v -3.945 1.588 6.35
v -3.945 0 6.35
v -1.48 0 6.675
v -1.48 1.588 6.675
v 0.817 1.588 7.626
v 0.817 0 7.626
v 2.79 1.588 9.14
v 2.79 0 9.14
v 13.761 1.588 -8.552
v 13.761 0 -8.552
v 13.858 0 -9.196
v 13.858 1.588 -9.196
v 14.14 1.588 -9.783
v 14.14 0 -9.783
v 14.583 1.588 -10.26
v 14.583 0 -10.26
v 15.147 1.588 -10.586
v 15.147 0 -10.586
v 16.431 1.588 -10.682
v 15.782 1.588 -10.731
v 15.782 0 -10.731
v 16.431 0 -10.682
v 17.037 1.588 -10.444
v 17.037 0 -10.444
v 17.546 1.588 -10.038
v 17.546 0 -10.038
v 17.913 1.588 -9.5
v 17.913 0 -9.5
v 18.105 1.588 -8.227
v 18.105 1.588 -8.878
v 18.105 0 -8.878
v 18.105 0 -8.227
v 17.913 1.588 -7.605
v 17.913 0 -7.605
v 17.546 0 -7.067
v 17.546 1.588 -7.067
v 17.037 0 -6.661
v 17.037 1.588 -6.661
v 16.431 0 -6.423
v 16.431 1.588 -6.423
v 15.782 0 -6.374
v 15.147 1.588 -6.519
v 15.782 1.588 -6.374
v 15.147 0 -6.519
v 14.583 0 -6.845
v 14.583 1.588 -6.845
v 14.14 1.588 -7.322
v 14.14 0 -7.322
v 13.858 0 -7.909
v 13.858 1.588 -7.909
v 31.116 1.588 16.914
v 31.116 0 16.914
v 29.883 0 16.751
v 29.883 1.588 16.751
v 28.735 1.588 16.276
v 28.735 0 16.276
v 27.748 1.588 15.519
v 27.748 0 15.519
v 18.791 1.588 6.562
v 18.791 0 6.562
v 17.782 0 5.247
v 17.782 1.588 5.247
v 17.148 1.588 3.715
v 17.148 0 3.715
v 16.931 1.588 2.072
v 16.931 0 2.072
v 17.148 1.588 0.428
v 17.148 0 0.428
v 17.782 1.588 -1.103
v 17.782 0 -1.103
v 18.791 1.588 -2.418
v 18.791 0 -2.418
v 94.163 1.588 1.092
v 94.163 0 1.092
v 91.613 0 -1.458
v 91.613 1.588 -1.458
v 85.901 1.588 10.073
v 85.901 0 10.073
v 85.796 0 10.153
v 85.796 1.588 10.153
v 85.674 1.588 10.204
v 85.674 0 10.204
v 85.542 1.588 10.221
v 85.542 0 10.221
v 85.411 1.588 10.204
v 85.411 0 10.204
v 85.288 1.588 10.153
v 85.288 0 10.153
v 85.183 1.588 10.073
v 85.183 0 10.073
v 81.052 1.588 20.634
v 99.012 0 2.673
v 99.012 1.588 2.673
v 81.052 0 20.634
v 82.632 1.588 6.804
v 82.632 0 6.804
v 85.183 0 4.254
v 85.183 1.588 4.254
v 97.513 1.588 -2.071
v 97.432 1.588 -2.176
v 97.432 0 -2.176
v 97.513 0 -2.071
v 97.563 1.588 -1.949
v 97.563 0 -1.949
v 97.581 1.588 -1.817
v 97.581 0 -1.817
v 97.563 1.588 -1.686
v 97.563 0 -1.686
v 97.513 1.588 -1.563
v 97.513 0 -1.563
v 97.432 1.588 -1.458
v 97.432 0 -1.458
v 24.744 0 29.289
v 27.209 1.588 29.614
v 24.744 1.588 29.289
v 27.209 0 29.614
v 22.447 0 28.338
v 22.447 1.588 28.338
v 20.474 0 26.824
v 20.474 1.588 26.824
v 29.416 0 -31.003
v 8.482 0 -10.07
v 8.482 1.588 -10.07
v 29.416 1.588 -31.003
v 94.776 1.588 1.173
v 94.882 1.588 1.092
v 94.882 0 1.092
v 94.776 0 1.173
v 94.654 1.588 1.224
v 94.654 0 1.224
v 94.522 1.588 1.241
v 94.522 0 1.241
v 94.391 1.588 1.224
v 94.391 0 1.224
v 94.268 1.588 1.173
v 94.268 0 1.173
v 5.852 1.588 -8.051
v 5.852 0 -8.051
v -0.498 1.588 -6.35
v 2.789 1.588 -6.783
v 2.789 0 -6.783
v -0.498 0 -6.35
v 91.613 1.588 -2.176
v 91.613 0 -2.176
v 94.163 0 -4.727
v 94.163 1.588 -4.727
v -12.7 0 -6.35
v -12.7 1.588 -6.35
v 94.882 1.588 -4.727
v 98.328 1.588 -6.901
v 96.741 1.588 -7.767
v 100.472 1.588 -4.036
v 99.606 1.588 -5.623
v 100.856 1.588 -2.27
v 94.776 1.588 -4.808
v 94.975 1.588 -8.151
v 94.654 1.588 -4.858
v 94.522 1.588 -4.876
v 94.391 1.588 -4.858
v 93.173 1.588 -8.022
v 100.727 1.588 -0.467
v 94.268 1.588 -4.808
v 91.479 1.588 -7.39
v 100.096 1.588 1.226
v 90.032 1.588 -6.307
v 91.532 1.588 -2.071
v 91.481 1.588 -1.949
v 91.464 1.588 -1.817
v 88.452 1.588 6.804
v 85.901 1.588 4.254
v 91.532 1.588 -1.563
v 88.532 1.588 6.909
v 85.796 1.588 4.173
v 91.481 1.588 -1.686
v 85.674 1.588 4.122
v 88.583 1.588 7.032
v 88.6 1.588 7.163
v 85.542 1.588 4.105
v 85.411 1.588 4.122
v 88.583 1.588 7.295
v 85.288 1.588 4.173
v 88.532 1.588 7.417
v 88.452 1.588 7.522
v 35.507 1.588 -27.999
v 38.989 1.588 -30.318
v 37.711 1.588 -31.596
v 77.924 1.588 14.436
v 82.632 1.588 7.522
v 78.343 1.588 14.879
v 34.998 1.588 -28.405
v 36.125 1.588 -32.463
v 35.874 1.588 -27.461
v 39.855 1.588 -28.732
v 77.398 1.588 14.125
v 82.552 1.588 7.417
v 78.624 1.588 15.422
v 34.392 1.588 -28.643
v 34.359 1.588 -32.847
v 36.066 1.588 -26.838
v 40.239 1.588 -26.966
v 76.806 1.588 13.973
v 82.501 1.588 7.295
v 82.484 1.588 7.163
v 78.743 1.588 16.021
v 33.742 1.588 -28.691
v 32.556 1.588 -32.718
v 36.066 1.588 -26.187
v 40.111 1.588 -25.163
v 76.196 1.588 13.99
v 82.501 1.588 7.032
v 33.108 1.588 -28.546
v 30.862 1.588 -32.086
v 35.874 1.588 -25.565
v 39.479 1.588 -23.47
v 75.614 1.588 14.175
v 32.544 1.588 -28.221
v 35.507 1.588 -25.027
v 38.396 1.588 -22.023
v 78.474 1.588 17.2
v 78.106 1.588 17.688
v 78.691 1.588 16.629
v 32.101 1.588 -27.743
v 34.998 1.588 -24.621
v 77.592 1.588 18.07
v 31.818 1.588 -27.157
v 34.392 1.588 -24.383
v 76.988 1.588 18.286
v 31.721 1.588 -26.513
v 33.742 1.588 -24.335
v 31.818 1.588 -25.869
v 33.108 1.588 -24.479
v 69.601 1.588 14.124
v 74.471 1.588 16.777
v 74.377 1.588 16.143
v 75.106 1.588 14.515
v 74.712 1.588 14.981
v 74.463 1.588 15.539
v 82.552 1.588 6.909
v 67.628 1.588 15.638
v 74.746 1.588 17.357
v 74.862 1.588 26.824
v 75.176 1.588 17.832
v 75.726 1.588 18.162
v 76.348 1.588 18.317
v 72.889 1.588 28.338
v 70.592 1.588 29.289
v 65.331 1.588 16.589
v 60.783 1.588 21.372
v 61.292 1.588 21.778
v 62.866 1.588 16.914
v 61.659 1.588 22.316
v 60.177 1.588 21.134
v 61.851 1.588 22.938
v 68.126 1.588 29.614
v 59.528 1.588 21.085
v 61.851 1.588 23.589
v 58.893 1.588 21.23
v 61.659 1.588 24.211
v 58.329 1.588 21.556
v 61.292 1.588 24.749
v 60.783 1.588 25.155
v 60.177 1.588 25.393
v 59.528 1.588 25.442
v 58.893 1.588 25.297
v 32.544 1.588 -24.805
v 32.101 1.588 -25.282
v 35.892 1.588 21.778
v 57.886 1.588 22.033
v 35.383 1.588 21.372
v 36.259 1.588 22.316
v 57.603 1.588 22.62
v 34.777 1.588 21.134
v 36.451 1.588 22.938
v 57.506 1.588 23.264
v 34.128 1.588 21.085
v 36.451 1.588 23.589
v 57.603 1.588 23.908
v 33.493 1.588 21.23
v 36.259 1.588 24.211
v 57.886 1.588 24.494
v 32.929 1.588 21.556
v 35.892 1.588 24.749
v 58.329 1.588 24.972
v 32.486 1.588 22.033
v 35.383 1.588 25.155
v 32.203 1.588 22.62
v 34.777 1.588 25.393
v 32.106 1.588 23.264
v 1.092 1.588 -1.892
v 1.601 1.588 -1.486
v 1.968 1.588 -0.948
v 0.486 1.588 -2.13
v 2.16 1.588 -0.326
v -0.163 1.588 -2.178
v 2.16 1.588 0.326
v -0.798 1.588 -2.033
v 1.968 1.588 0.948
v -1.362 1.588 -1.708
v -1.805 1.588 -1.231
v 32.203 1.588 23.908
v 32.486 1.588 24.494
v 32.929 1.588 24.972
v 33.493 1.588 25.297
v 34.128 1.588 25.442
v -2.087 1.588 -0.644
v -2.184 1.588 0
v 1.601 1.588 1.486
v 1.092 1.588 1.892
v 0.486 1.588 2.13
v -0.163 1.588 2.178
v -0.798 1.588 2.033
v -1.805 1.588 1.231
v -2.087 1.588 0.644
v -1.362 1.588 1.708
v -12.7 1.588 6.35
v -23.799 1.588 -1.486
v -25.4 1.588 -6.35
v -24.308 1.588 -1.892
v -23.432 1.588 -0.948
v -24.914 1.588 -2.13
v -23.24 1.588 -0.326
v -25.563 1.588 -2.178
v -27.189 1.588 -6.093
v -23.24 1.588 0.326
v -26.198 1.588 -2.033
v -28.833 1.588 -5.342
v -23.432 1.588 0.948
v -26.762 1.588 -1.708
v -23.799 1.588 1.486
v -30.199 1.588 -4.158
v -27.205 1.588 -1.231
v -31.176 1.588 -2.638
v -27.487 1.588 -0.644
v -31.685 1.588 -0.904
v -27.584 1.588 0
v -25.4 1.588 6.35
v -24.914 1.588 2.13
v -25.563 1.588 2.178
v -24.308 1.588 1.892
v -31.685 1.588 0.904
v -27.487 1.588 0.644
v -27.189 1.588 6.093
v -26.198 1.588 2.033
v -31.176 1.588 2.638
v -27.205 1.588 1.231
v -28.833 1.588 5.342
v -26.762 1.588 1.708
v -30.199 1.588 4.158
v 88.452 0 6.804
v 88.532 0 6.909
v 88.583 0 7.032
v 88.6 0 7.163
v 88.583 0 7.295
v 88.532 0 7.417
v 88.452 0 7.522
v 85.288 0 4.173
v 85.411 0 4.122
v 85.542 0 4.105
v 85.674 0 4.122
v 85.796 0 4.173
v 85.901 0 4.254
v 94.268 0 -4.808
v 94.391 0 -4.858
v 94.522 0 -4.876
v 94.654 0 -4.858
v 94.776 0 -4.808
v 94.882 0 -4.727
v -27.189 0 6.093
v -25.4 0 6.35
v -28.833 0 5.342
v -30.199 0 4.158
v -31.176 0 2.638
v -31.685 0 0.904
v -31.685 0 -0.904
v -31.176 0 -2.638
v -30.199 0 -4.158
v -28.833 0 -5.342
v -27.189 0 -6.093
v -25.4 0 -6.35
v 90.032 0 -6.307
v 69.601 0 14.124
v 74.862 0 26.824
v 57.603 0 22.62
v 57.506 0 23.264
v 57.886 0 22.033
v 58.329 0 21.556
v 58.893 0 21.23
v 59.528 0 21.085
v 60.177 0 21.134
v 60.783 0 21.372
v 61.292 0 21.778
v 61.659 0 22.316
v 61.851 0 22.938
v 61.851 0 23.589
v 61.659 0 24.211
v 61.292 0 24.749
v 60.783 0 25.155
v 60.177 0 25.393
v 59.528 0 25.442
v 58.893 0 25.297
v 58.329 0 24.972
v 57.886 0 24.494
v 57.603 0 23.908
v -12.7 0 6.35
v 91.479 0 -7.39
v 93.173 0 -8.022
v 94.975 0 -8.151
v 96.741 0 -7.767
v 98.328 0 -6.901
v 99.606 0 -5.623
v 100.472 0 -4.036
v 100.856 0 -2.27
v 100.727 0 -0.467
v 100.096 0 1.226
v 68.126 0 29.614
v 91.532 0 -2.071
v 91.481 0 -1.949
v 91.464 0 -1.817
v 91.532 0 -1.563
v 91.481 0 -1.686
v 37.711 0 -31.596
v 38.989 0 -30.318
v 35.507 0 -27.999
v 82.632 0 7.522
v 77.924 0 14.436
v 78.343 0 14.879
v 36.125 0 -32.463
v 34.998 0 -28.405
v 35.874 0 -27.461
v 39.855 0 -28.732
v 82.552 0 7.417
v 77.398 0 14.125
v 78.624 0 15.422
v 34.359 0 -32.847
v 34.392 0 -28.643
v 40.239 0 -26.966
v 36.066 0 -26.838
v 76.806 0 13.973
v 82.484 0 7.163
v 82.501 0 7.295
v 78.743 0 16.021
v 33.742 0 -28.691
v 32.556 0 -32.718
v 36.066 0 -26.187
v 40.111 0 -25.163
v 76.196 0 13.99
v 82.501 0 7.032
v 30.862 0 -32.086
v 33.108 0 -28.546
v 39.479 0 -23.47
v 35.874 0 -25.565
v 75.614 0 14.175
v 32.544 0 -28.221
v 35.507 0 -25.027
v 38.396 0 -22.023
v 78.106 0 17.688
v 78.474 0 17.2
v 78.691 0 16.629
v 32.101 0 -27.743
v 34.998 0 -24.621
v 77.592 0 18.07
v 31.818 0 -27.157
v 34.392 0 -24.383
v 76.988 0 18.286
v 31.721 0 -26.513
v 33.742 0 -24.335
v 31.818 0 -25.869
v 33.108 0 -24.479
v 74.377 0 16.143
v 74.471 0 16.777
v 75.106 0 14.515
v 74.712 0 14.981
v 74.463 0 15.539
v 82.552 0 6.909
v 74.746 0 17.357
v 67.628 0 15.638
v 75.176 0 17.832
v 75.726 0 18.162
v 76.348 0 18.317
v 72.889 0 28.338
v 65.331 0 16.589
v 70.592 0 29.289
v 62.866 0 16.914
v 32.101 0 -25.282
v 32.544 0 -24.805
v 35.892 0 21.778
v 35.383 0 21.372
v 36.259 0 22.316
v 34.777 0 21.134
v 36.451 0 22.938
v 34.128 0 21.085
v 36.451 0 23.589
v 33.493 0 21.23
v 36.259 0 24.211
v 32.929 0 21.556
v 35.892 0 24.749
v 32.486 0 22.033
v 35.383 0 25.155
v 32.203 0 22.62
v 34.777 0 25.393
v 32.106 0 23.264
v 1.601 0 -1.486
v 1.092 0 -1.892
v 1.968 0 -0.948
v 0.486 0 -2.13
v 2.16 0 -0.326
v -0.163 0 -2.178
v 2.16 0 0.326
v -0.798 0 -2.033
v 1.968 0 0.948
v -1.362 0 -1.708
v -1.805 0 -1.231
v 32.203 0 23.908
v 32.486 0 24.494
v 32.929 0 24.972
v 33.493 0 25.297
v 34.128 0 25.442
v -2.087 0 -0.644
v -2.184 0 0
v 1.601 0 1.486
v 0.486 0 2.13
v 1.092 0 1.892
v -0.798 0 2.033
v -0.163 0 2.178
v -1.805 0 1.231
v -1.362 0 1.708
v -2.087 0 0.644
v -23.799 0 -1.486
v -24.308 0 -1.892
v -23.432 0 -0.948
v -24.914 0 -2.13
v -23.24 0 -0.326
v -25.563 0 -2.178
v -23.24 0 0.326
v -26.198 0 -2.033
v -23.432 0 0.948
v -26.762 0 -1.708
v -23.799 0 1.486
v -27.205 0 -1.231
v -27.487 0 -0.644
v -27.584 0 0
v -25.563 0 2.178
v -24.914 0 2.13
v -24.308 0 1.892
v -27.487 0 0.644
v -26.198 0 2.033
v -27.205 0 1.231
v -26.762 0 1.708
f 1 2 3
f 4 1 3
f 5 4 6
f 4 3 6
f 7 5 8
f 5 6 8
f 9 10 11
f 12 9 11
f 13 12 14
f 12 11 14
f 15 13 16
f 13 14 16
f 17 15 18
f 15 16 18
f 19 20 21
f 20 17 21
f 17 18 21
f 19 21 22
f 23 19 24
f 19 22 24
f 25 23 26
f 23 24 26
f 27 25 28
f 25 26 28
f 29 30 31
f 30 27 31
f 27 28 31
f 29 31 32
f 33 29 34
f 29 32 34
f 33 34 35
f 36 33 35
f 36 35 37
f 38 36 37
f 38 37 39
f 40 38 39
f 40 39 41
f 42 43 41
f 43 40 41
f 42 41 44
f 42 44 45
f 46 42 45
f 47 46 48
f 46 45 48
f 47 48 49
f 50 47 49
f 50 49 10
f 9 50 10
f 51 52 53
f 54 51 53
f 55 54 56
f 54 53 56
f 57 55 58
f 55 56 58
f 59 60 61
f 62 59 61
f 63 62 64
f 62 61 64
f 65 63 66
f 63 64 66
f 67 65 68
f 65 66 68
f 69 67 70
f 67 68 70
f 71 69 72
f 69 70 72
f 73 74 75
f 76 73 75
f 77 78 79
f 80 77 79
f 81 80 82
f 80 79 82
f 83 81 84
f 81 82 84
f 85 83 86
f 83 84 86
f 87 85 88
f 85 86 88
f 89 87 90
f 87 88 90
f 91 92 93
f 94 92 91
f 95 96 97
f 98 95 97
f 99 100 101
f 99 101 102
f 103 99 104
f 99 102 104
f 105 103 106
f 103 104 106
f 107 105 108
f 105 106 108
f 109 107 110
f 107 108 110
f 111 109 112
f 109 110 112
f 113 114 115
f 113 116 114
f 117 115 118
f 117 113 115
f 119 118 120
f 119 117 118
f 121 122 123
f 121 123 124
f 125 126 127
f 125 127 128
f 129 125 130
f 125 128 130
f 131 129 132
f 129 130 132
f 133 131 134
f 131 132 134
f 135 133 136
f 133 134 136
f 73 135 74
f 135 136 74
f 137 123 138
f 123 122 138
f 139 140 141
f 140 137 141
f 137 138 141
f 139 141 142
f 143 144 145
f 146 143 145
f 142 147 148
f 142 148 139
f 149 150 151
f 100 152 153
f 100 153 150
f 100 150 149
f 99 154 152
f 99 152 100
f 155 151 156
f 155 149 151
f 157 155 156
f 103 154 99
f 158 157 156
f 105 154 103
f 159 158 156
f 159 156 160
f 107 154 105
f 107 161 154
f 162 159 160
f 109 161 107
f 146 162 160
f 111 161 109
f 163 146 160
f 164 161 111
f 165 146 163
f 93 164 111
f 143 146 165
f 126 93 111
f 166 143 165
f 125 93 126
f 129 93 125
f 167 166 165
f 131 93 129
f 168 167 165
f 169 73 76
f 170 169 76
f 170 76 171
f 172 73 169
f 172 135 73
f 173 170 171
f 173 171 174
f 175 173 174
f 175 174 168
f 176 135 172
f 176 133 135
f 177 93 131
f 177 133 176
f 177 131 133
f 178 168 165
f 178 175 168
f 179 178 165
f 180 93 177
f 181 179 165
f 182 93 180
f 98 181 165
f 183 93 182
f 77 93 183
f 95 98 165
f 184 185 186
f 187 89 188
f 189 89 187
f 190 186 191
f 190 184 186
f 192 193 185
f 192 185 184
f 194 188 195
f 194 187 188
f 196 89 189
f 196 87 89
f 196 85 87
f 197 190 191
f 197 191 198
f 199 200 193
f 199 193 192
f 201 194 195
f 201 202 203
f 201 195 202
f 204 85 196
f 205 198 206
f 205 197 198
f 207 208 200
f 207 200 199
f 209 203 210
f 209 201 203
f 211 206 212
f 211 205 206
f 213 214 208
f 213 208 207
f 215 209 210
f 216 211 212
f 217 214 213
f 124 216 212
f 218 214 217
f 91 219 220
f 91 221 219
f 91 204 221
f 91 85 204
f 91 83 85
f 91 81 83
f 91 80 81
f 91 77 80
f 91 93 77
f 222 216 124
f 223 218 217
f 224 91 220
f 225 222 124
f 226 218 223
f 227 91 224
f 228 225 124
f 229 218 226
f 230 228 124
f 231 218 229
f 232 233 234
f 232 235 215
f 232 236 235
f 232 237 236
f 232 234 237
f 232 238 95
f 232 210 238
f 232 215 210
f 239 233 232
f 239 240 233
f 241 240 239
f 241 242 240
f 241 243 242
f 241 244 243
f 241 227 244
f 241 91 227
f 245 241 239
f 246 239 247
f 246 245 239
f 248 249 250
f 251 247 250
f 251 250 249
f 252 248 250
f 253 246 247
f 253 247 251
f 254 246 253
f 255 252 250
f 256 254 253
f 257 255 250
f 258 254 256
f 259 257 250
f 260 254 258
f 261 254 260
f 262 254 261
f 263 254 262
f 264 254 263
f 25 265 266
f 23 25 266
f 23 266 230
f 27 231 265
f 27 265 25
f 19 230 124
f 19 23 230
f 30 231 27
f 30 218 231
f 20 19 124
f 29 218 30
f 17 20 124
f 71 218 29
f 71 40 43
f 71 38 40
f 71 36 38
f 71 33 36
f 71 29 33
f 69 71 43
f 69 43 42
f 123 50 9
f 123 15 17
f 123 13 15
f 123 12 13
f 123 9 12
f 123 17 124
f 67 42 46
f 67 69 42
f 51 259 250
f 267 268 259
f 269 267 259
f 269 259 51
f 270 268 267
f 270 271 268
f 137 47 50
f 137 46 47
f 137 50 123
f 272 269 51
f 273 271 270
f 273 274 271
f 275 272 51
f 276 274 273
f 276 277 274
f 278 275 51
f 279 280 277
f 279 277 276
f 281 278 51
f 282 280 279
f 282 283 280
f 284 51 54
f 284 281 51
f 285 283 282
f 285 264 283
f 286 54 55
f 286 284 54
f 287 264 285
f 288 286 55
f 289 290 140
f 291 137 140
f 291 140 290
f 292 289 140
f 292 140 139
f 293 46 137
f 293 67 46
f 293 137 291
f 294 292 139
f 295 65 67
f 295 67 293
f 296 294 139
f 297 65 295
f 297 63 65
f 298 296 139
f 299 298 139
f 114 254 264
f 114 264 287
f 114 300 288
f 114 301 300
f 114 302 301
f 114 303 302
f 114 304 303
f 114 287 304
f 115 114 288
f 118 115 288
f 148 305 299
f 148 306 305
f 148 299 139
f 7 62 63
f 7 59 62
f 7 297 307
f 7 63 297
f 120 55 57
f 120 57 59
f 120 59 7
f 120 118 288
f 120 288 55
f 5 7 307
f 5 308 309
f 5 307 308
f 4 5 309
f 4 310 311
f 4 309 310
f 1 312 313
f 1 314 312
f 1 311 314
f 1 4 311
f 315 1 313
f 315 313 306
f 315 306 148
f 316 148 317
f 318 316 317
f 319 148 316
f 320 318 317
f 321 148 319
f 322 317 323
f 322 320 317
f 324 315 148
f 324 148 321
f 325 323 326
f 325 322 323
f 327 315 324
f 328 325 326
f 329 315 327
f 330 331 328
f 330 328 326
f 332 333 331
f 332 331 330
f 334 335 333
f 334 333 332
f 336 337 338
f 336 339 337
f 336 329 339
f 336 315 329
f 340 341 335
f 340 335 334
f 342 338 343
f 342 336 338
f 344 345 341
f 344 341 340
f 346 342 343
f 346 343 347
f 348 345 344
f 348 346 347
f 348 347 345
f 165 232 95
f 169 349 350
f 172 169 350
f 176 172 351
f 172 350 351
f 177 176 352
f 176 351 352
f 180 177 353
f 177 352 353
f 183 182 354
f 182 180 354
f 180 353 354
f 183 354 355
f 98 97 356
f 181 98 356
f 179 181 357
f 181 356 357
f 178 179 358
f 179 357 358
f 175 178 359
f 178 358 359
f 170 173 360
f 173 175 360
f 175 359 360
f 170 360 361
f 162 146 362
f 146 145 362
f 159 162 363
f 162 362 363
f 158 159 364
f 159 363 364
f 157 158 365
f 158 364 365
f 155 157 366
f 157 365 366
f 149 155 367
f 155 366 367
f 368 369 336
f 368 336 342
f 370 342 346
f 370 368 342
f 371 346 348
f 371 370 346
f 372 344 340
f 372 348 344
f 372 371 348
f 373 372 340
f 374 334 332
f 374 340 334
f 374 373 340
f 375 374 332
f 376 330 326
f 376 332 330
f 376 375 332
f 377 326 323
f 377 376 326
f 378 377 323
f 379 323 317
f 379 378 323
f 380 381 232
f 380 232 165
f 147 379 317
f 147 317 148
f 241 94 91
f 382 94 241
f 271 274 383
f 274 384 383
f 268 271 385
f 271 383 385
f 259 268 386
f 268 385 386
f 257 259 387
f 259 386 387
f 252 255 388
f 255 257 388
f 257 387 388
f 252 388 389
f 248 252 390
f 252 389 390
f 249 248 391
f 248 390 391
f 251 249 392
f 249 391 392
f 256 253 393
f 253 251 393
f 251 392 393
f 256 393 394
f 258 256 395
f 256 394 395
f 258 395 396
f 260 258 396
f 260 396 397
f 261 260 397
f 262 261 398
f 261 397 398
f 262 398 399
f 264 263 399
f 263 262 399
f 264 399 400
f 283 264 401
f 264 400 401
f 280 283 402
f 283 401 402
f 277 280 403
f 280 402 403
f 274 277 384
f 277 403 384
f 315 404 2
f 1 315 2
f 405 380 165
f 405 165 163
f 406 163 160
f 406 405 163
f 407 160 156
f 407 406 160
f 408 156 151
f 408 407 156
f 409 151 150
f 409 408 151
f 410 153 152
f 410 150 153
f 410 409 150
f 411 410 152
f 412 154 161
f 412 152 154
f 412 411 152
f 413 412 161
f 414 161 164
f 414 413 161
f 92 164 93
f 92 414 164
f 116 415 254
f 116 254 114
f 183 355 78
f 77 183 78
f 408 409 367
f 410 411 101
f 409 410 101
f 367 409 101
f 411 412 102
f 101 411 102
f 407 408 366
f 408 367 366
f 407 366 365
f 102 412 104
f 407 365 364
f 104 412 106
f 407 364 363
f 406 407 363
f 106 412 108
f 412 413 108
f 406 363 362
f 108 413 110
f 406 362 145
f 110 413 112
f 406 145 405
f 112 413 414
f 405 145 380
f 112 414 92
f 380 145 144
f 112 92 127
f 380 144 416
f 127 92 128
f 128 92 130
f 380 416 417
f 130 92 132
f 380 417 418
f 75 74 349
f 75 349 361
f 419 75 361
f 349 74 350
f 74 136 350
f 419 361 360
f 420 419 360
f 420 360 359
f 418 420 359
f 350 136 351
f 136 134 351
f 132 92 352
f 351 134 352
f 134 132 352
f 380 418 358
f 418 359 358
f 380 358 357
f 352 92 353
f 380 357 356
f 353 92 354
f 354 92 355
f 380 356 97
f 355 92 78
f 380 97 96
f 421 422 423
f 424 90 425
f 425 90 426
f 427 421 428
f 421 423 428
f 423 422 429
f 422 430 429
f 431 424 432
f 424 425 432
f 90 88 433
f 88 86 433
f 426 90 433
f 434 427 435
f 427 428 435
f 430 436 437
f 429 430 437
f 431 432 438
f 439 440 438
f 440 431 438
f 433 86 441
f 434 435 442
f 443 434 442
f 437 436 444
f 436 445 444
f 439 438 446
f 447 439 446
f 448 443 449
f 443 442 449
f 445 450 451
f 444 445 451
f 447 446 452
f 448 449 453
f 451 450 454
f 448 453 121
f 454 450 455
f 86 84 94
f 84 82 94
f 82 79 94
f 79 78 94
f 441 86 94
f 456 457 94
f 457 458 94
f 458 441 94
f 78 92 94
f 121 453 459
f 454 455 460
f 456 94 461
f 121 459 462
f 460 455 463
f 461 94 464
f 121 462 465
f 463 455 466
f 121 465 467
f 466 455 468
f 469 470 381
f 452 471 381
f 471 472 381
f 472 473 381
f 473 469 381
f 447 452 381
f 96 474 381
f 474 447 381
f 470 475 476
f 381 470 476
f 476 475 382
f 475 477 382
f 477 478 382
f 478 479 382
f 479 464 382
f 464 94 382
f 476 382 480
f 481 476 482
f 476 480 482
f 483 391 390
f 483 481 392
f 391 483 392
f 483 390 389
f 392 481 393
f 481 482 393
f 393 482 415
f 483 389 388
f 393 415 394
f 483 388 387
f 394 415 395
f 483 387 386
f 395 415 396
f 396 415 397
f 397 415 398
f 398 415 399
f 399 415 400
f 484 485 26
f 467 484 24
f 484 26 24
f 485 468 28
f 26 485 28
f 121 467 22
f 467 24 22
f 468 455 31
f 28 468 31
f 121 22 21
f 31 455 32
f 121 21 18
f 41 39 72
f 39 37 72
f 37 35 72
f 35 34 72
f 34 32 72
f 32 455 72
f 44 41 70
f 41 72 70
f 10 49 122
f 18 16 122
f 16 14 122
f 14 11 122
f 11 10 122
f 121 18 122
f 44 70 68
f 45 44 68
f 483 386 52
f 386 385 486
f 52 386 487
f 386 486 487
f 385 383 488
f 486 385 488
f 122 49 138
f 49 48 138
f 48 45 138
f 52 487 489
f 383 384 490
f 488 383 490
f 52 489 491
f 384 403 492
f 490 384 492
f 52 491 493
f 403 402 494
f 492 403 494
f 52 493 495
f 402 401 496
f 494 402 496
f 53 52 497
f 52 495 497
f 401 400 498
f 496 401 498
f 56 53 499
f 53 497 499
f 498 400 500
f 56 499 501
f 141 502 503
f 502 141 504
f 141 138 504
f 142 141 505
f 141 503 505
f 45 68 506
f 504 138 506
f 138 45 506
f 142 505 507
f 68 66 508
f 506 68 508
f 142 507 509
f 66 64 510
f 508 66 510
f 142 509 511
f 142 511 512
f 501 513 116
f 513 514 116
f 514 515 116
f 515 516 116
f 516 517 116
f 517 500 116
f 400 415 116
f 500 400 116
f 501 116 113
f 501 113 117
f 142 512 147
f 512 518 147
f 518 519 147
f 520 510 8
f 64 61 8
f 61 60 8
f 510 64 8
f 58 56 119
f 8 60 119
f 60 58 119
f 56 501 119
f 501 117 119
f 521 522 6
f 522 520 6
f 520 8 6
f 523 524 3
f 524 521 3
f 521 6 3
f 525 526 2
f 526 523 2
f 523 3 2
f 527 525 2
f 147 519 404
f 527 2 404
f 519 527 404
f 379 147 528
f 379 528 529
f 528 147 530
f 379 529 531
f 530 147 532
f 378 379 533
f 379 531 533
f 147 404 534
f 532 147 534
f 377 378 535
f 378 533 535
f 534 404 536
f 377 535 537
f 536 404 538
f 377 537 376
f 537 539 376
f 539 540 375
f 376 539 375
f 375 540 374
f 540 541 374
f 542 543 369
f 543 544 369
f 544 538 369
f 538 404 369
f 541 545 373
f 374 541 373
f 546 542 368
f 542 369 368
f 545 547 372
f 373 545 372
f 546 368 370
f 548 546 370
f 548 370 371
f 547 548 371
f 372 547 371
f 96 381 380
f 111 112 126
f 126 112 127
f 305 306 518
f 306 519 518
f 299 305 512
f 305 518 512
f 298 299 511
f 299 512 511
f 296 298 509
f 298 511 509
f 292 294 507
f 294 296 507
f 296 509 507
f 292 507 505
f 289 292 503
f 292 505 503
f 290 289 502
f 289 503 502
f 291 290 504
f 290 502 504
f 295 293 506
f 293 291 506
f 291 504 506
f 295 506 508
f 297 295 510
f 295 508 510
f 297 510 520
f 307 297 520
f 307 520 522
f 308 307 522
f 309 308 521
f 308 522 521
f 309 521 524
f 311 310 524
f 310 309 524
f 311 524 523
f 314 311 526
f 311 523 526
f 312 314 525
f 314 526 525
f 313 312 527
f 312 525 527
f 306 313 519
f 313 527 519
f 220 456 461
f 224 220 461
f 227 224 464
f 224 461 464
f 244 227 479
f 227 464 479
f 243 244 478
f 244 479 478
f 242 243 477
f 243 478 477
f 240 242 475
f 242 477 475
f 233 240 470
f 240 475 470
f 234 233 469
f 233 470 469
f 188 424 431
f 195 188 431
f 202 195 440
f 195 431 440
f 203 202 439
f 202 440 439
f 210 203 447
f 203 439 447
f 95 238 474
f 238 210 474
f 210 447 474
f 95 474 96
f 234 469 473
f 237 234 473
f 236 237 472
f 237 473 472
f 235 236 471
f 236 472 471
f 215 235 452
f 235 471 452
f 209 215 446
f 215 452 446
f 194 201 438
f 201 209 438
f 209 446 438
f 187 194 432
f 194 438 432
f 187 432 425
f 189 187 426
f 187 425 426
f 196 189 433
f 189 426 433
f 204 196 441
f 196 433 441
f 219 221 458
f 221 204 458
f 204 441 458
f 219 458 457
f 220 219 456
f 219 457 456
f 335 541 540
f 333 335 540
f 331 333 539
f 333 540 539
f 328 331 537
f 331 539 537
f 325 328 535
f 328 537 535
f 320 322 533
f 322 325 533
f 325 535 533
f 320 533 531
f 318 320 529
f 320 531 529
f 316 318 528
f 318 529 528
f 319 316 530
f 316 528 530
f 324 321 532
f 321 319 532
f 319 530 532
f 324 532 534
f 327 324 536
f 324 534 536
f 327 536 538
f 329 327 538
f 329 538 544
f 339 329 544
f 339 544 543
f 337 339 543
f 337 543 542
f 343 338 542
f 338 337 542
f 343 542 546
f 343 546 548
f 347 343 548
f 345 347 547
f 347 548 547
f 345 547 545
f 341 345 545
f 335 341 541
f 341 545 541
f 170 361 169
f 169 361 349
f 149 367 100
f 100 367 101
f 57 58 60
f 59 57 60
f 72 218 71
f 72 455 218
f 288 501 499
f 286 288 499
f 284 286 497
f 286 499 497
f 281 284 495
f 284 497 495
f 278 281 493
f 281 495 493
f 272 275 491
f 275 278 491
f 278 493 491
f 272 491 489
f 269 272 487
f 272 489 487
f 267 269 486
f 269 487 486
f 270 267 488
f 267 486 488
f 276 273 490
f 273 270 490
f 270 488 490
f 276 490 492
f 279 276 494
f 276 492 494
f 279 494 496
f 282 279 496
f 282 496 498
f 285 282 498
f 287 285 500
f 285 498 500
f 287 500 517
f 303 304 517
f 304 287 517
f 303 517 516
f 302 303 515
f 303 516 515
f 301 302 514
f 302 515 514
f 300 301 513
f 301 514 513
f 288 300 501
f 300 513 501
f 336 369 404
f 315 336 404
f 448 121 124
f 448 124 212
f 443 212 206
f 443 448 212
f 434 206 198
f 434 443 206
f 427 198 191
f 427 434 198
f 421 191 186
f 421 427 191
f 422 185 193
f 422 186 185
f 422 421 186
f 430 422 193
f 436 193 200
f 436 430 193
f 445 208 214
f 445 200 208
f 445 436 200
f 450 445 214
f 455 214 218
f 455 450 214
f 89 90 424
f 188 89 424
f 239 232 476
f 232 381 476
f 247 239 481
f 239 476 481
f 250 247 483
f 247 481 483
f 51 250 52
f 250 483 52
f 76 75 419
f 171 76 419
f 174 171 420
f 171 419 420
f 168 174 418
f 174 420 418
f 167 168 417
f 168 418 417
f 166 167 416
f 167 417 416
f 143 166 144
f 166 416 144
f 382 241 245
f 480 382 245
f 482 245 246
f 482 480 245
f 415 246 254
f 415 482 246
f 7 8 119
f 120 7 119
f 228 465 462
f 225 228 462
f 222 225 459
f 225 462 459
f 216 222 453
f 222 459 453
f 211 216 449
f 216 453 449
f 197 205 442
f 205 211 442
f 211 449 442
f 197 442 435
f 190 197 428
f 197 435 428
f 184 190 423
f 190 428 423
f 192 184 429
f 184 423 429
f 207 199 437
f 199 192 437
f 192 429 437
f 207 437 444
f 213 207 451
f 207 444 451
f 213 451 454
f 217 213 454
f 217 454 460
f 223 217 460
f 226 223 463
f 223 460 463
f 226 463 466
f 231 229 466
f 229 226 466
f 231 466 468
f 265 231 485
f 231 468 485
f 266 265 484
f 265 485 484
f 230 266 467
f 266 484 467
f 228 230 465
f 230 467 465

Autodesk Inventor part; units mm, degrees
ref_plane "YZ Plane" through (0, 0, 0) normal (1, 0, 0) x (0, 1, 0)
ref_plane "XZ Plane" through (0, 0, 0) normal (0, 1, 0) x (-1, 0, 0)
ref_plane "XY Plane" through (0, 0, 0) normal (0, 0, 1) x (1, 0, 0)
sketch "main" plane through (0, 0, 0) normal (0, 0, 1) x (1, 0, 0)
  line L0 (-25.7346, 15.6158) -> (-23.1842, 13.0654)
  arc A0 (-23.1842, 12.347) -> (-23.1842, 13.0654) centre (-23.5434, 12.7062) ccw
  line L1 (-23.1842, 12.347) -> (-25.7346, 9.7966)
  line L2 (-29.0034, 13.0654) -> (-26.453, 15.6158)
  circle A1 centre (-26.0938, 12.7062) radius 2.1844 construction
  arc A2 (-29.0034, 13.0654) -> (-29.0034, 12.347) centre (-28.6442, 12.7062) ccw
  line L3 (-26.453, 9.7966) -> (-29.0034, 12.347)
  arc A3 (-32.1645, 3.3667) -> (-32.1645, 4.0851) centre (-32.5237, 3.7259) ccw
  arc A4 (-26.453, 9.7966) -> (-25.7346, 9.7966) centre (-26.0938, 10.1558) ccw
  arc A5 (-8.6781, 35.1568) -> (-15.4133, 32.367) centre (-8.6781, 25.6318) ccw
  circle A6 centre (-17.1136, 21.6864) radius 2.1844
  arc A7 (-25.7346, 15.6158) -> (-26.453, 15.6158) centre (-26.0938, 15.2566) ccw
  line L4 (-10.1527, 19.667) -> (-30.584, -0.7642)
  line L5 (-39.5642, 8.216) -> (-15.4133, 32.367)
  line L6 (-17.1136, 21.6864) -> (-10.7636, 21.6864) construction
  line L7 (-17.1136, 21.6864) -> (-21.6037, 26.1765)
  arc A8 (-34.7149, 6.6355) -> (-35.4333, 6.6355) centre (-35.0741, 6.2763) ccw
  line L8 (-34.7149, 6.6355) -> (-32.1645, 4.0851)
  line L9 (-32.1645, 3.3667) -> (-34.7149, 0.8163)
  arc A9 (-37.9837, 4.0851) -> (-37.9837, 3.3667) centre (-37.6245, 3.7259) ccw
  arc A10 (-35.4333, 0.8163) -> (-34.7149, 0.8163) centre (-35.0741, 1.1755) ccw
  line L10 (-35.4333, 0.8163) -> (-37.9837, 3.3667)
  arc A11 (-39.5642, 8.216) -> (-30.584, -0.7642) centre (-35.0741, 3.7259) ccw
  line L11 (-37.9837, 4.0851) -> (-35.4333, 6.6355)
  circle A12 centre (43.5032, -3.0093) radius 2.1844
  circle A13 centre (25.5426, -20.9698) radius 2.1844
  arc A14 (21.0525, -16.4797) -> (30.0328, -25.4599) centre (25.5426, -20.9698) ccw
  line L12 (21.0525, -16.4797) -> (40.6569, 3.1247)
  line L13 (50.966, -4.5267) -> (30.0328, -25.4599)
  circle A15 centre (59.4482, 5.5431) radius 2.1844
  line L14 (72.1482, 11.8931) -> (63.3936, 11.8931)
  line L15 (56.6584, 14.6829) -> (38.9743, 32.367)
  line L16 (72.1482, -0.8069) -> (59.9463, -0.8069)
  arc A16 (56.6584, 14.6829) -> (63.3936, 11.8931) centre (63.3936, 21.4181) ccw
  line L17 (84.8482, 11.8931) -> (72.1482, 11.8931)
  line L18 (84.8482, -0.8069) -> (72.1482, -0.8069)
  circle A17 centre (84.8482, 5.5431) radius 2.1844
  arc A18 (84.8482, -0.8069) -> (84.8482, 11.8931) centre (84.8482, 5.5431) ccw
  arc A19 (59.9463, -0.8069) -> (50.966, -4.5267) centre (59.9463, -13.5069) ccw
  arc A20 (-3.4175, 22.4568) -> (-10.1527, 19.667) centre (-3.4175, 12.9318) ccw
  line L19 (-3.4175, 22.4568) -> (28.3325, 22.4568)
  line L20 (-8.6781, 35.1568) -> (32.2391, 35.1568)
  arc A21 (31.7001, 21.0619) -> (28.3325, 22.4568) centre (28.3325, 17.6943) ccw
  arc A22 (38.9743, 32.367) -> (32.2391, 35.1568) centre (32.2391, 25.6318) ccw
  line L21 (31.7001, 21.0619) -> (40.6569, 12.105)
  line L22 (31.7001, 21.0619) -> (44.367, 21.0619) construction
  arc A23 (40.6569, 3.1247) -> (40.6569, 12.105) centre (36.1668, 7.6149) ccw
  circle A24 centre (25.1575, 28.8068) radius 2.1844
  circle A25 centre (-0.2425, 28.8068) radius 2.1844
  point P0 (7.2046, 10.3806)
  point P1 (59.4482, 11.8931)
  dimension "d5" = 12.7
  dimension "d6" = 135
  dimension "d7" = 9.525
  dimension "d8" = 12.7
  dimension "d9" = 9.525
  dimension "d10" = 9.525
  dimension "d11" = 12.7
  dimension "d12" = 4.7625
  dimension "d15" = 31.75
  dimension "d16" = 12.7
  dimension "d17" = 45
  dimension "d18" = 6.35
  dimension "d19" = 4.3688
  dimension "d20" = 6.35
  dimension "d24" = 4.3688
sketch "Sketch1" plane through (0, 0, 0) normal (0, 1, 0) x (-1, 0, 0)
  line L0 (-85.1829, 10.0727) -> (-82.6325, 7.5223)
  arc A0 (-82.6325, 6.8039) -> (-82.6325, 7.5223) centre (-82.9917, 7.1631) ccw
  line L1 (-82.6325, 6.8039) -> (-85.1829, 4.2535)
  line L2 (-88.4517, 7.5223) -> (-85.9013, 10.0727)
  circle A1 centre (-85.5421, 7.1631) radius 2.1844 construction
  arc A2 (-88.4517, 7.5223) -> (-88.4517, 6.8039) centre (-88.0925, 7.1631) ccw
  line L3 (-85.9013, 4.2535) -> (-88.4517, 6.8039)
  arc A3 (-91.6127, -2.1764) -> (-91.6127, -1.4579) centre (-91.9719, -1.8171) ccw
  arc A4 (-85.9013, 4.2535) -> (-85.1829, 4.2535) centre (-85.5421, 4.6127) ccw
  arc A5 (-68.1263, 29.6137) -> (-74.8615, 26.8239) centre (-68.1263, 20.0887) ccw
  circle A6 centre (-76.5618, 16.1434) radius 2.1844
  arc A7 (-85.1829, 10.0727) -> (-85.9013, 10.0727) centre (-85.5421, 9.7135) ccw
  line L4 (-69.601, 14.1239) -> (-90.0322, -6.3073)
  line L5 (-99.0125, 2.673) -> (-74.8615, 26.8239)
  line L6 (-76.5618, 16.1434) -> (-70.2118, 16.1434) construction
  line L7 (-76.5618, 16.1434) -> (-81.0519, 20.6335)
  arc A8 (-94.1631, 1.0925) -> (-94.8815, 1.0925) centre (-94.5223, 0.7332) ccw
  line L8 (-94.1631, 1.0925) -> (-91.6127, -1.4579)
  line L9 (-91.6127, -2.1764) -> (-94.1631, -4.7268)
  arc A9 (-97.4319, -1.4579) -> (-97.4319, -2.1764) centre (-97.0727, -1.8171) ccw
  arc A10 (-94.8815, -4.7268) -> (-94.1631, -4.7268) centre (-94.5223, -4.3675) ccw
  line L10 (-94.8815, -4.7268) -> (-97.4319, -2.1764)
  arc A11 (-99.0125, 2.673) -> (-90.0322, -6.3073) centre (-94.5223, -1.8172) ccw
  line L11 (-97.4319, -1.4579) -> (-94.8815, 1.0925)
  circle A12 centre (-15.9451, -8.5524) radius 2.1844
  circle A13 centre (-33.9056, -26.5129) radius 2.1844
  arc A14 (-38.3957, -22.0227) -> (-29.4155, -31.003) centre (-33.9056, -26.5129) ccw
  line L12 (-38.3957, -22.0227) -> (-18.7913, -2.4183)
  line L13 (-8.4822, -10.0697) -> (-29.4155, -31.003)
  circle A15 centre (0, 0) radius 2.1844
  line L14 (12.7, 6.35) -> (3.9454, 6.35)
  line L15 (-2.7898, 9.1398) -> (-20.4739, 26.8239)
  line L16 (12.7, -6.35) -> (0.498, -6.35)
  arc A16 (-2.7898, 9.1398) -> (3.9454, 6.35) centre (3.9454, 15.875) ccw
  line L17 (25.4, 6.35) -> (12.7, 6.35)
  line L18 (25.4, -6.35) -> (12.7, -6.35)
  circle A17 centre (25.4, 0) radius 2.1844
  arc A18 (25.4, -6.35) -> (25.4, 6.35) centre (25.4, 0) ccw
  arc A19 (0.498, -6.35) -> (-8.4822, -10.0697) centre (0.498, -19.05) ccw
  arc A20 (-62.8658, 16.9137) -> (-69.601, 14.1239) centre (-62.8658, 7.3887) ccw
  line L19 (-62.8658, 16.9137) -> (-31.1158, 16.9137)
  line L20 (-68.1263, 29.6137) -> (-27.2091, 29.6137)
  arc A21 (-27.7482, 15.5188) -> (-31.1158, 16.9137) centre (-31.1158, 12.1512) ccw
  arc A22 (-20.4739, 26.8239) -> (-27.2091, 29.6137) centre (-27.2091, 20.0887) ccw
  line L21 (-27.7482, 15.5188) -> (-18.7913, 6.5619)
  line L22 (-27.7482, 15.5188) -> (-15.0812, 15.5188) construction
  arc A23 (-18.7913, -2.4183) -> (-18.7913, 6.5619) centre (-23.2814, 2.0718) ccw
  circle A24 centre (-34.2908, 23.2637) radius 2.1844
  circle A25 centre (-59.6908, 23.2637) radius 2.1844
extrude "Extrusion1" add sketch "Sketch1" along normal blind 1.5875
properties part number "join_gusset" material "Acetal Resin, White"
